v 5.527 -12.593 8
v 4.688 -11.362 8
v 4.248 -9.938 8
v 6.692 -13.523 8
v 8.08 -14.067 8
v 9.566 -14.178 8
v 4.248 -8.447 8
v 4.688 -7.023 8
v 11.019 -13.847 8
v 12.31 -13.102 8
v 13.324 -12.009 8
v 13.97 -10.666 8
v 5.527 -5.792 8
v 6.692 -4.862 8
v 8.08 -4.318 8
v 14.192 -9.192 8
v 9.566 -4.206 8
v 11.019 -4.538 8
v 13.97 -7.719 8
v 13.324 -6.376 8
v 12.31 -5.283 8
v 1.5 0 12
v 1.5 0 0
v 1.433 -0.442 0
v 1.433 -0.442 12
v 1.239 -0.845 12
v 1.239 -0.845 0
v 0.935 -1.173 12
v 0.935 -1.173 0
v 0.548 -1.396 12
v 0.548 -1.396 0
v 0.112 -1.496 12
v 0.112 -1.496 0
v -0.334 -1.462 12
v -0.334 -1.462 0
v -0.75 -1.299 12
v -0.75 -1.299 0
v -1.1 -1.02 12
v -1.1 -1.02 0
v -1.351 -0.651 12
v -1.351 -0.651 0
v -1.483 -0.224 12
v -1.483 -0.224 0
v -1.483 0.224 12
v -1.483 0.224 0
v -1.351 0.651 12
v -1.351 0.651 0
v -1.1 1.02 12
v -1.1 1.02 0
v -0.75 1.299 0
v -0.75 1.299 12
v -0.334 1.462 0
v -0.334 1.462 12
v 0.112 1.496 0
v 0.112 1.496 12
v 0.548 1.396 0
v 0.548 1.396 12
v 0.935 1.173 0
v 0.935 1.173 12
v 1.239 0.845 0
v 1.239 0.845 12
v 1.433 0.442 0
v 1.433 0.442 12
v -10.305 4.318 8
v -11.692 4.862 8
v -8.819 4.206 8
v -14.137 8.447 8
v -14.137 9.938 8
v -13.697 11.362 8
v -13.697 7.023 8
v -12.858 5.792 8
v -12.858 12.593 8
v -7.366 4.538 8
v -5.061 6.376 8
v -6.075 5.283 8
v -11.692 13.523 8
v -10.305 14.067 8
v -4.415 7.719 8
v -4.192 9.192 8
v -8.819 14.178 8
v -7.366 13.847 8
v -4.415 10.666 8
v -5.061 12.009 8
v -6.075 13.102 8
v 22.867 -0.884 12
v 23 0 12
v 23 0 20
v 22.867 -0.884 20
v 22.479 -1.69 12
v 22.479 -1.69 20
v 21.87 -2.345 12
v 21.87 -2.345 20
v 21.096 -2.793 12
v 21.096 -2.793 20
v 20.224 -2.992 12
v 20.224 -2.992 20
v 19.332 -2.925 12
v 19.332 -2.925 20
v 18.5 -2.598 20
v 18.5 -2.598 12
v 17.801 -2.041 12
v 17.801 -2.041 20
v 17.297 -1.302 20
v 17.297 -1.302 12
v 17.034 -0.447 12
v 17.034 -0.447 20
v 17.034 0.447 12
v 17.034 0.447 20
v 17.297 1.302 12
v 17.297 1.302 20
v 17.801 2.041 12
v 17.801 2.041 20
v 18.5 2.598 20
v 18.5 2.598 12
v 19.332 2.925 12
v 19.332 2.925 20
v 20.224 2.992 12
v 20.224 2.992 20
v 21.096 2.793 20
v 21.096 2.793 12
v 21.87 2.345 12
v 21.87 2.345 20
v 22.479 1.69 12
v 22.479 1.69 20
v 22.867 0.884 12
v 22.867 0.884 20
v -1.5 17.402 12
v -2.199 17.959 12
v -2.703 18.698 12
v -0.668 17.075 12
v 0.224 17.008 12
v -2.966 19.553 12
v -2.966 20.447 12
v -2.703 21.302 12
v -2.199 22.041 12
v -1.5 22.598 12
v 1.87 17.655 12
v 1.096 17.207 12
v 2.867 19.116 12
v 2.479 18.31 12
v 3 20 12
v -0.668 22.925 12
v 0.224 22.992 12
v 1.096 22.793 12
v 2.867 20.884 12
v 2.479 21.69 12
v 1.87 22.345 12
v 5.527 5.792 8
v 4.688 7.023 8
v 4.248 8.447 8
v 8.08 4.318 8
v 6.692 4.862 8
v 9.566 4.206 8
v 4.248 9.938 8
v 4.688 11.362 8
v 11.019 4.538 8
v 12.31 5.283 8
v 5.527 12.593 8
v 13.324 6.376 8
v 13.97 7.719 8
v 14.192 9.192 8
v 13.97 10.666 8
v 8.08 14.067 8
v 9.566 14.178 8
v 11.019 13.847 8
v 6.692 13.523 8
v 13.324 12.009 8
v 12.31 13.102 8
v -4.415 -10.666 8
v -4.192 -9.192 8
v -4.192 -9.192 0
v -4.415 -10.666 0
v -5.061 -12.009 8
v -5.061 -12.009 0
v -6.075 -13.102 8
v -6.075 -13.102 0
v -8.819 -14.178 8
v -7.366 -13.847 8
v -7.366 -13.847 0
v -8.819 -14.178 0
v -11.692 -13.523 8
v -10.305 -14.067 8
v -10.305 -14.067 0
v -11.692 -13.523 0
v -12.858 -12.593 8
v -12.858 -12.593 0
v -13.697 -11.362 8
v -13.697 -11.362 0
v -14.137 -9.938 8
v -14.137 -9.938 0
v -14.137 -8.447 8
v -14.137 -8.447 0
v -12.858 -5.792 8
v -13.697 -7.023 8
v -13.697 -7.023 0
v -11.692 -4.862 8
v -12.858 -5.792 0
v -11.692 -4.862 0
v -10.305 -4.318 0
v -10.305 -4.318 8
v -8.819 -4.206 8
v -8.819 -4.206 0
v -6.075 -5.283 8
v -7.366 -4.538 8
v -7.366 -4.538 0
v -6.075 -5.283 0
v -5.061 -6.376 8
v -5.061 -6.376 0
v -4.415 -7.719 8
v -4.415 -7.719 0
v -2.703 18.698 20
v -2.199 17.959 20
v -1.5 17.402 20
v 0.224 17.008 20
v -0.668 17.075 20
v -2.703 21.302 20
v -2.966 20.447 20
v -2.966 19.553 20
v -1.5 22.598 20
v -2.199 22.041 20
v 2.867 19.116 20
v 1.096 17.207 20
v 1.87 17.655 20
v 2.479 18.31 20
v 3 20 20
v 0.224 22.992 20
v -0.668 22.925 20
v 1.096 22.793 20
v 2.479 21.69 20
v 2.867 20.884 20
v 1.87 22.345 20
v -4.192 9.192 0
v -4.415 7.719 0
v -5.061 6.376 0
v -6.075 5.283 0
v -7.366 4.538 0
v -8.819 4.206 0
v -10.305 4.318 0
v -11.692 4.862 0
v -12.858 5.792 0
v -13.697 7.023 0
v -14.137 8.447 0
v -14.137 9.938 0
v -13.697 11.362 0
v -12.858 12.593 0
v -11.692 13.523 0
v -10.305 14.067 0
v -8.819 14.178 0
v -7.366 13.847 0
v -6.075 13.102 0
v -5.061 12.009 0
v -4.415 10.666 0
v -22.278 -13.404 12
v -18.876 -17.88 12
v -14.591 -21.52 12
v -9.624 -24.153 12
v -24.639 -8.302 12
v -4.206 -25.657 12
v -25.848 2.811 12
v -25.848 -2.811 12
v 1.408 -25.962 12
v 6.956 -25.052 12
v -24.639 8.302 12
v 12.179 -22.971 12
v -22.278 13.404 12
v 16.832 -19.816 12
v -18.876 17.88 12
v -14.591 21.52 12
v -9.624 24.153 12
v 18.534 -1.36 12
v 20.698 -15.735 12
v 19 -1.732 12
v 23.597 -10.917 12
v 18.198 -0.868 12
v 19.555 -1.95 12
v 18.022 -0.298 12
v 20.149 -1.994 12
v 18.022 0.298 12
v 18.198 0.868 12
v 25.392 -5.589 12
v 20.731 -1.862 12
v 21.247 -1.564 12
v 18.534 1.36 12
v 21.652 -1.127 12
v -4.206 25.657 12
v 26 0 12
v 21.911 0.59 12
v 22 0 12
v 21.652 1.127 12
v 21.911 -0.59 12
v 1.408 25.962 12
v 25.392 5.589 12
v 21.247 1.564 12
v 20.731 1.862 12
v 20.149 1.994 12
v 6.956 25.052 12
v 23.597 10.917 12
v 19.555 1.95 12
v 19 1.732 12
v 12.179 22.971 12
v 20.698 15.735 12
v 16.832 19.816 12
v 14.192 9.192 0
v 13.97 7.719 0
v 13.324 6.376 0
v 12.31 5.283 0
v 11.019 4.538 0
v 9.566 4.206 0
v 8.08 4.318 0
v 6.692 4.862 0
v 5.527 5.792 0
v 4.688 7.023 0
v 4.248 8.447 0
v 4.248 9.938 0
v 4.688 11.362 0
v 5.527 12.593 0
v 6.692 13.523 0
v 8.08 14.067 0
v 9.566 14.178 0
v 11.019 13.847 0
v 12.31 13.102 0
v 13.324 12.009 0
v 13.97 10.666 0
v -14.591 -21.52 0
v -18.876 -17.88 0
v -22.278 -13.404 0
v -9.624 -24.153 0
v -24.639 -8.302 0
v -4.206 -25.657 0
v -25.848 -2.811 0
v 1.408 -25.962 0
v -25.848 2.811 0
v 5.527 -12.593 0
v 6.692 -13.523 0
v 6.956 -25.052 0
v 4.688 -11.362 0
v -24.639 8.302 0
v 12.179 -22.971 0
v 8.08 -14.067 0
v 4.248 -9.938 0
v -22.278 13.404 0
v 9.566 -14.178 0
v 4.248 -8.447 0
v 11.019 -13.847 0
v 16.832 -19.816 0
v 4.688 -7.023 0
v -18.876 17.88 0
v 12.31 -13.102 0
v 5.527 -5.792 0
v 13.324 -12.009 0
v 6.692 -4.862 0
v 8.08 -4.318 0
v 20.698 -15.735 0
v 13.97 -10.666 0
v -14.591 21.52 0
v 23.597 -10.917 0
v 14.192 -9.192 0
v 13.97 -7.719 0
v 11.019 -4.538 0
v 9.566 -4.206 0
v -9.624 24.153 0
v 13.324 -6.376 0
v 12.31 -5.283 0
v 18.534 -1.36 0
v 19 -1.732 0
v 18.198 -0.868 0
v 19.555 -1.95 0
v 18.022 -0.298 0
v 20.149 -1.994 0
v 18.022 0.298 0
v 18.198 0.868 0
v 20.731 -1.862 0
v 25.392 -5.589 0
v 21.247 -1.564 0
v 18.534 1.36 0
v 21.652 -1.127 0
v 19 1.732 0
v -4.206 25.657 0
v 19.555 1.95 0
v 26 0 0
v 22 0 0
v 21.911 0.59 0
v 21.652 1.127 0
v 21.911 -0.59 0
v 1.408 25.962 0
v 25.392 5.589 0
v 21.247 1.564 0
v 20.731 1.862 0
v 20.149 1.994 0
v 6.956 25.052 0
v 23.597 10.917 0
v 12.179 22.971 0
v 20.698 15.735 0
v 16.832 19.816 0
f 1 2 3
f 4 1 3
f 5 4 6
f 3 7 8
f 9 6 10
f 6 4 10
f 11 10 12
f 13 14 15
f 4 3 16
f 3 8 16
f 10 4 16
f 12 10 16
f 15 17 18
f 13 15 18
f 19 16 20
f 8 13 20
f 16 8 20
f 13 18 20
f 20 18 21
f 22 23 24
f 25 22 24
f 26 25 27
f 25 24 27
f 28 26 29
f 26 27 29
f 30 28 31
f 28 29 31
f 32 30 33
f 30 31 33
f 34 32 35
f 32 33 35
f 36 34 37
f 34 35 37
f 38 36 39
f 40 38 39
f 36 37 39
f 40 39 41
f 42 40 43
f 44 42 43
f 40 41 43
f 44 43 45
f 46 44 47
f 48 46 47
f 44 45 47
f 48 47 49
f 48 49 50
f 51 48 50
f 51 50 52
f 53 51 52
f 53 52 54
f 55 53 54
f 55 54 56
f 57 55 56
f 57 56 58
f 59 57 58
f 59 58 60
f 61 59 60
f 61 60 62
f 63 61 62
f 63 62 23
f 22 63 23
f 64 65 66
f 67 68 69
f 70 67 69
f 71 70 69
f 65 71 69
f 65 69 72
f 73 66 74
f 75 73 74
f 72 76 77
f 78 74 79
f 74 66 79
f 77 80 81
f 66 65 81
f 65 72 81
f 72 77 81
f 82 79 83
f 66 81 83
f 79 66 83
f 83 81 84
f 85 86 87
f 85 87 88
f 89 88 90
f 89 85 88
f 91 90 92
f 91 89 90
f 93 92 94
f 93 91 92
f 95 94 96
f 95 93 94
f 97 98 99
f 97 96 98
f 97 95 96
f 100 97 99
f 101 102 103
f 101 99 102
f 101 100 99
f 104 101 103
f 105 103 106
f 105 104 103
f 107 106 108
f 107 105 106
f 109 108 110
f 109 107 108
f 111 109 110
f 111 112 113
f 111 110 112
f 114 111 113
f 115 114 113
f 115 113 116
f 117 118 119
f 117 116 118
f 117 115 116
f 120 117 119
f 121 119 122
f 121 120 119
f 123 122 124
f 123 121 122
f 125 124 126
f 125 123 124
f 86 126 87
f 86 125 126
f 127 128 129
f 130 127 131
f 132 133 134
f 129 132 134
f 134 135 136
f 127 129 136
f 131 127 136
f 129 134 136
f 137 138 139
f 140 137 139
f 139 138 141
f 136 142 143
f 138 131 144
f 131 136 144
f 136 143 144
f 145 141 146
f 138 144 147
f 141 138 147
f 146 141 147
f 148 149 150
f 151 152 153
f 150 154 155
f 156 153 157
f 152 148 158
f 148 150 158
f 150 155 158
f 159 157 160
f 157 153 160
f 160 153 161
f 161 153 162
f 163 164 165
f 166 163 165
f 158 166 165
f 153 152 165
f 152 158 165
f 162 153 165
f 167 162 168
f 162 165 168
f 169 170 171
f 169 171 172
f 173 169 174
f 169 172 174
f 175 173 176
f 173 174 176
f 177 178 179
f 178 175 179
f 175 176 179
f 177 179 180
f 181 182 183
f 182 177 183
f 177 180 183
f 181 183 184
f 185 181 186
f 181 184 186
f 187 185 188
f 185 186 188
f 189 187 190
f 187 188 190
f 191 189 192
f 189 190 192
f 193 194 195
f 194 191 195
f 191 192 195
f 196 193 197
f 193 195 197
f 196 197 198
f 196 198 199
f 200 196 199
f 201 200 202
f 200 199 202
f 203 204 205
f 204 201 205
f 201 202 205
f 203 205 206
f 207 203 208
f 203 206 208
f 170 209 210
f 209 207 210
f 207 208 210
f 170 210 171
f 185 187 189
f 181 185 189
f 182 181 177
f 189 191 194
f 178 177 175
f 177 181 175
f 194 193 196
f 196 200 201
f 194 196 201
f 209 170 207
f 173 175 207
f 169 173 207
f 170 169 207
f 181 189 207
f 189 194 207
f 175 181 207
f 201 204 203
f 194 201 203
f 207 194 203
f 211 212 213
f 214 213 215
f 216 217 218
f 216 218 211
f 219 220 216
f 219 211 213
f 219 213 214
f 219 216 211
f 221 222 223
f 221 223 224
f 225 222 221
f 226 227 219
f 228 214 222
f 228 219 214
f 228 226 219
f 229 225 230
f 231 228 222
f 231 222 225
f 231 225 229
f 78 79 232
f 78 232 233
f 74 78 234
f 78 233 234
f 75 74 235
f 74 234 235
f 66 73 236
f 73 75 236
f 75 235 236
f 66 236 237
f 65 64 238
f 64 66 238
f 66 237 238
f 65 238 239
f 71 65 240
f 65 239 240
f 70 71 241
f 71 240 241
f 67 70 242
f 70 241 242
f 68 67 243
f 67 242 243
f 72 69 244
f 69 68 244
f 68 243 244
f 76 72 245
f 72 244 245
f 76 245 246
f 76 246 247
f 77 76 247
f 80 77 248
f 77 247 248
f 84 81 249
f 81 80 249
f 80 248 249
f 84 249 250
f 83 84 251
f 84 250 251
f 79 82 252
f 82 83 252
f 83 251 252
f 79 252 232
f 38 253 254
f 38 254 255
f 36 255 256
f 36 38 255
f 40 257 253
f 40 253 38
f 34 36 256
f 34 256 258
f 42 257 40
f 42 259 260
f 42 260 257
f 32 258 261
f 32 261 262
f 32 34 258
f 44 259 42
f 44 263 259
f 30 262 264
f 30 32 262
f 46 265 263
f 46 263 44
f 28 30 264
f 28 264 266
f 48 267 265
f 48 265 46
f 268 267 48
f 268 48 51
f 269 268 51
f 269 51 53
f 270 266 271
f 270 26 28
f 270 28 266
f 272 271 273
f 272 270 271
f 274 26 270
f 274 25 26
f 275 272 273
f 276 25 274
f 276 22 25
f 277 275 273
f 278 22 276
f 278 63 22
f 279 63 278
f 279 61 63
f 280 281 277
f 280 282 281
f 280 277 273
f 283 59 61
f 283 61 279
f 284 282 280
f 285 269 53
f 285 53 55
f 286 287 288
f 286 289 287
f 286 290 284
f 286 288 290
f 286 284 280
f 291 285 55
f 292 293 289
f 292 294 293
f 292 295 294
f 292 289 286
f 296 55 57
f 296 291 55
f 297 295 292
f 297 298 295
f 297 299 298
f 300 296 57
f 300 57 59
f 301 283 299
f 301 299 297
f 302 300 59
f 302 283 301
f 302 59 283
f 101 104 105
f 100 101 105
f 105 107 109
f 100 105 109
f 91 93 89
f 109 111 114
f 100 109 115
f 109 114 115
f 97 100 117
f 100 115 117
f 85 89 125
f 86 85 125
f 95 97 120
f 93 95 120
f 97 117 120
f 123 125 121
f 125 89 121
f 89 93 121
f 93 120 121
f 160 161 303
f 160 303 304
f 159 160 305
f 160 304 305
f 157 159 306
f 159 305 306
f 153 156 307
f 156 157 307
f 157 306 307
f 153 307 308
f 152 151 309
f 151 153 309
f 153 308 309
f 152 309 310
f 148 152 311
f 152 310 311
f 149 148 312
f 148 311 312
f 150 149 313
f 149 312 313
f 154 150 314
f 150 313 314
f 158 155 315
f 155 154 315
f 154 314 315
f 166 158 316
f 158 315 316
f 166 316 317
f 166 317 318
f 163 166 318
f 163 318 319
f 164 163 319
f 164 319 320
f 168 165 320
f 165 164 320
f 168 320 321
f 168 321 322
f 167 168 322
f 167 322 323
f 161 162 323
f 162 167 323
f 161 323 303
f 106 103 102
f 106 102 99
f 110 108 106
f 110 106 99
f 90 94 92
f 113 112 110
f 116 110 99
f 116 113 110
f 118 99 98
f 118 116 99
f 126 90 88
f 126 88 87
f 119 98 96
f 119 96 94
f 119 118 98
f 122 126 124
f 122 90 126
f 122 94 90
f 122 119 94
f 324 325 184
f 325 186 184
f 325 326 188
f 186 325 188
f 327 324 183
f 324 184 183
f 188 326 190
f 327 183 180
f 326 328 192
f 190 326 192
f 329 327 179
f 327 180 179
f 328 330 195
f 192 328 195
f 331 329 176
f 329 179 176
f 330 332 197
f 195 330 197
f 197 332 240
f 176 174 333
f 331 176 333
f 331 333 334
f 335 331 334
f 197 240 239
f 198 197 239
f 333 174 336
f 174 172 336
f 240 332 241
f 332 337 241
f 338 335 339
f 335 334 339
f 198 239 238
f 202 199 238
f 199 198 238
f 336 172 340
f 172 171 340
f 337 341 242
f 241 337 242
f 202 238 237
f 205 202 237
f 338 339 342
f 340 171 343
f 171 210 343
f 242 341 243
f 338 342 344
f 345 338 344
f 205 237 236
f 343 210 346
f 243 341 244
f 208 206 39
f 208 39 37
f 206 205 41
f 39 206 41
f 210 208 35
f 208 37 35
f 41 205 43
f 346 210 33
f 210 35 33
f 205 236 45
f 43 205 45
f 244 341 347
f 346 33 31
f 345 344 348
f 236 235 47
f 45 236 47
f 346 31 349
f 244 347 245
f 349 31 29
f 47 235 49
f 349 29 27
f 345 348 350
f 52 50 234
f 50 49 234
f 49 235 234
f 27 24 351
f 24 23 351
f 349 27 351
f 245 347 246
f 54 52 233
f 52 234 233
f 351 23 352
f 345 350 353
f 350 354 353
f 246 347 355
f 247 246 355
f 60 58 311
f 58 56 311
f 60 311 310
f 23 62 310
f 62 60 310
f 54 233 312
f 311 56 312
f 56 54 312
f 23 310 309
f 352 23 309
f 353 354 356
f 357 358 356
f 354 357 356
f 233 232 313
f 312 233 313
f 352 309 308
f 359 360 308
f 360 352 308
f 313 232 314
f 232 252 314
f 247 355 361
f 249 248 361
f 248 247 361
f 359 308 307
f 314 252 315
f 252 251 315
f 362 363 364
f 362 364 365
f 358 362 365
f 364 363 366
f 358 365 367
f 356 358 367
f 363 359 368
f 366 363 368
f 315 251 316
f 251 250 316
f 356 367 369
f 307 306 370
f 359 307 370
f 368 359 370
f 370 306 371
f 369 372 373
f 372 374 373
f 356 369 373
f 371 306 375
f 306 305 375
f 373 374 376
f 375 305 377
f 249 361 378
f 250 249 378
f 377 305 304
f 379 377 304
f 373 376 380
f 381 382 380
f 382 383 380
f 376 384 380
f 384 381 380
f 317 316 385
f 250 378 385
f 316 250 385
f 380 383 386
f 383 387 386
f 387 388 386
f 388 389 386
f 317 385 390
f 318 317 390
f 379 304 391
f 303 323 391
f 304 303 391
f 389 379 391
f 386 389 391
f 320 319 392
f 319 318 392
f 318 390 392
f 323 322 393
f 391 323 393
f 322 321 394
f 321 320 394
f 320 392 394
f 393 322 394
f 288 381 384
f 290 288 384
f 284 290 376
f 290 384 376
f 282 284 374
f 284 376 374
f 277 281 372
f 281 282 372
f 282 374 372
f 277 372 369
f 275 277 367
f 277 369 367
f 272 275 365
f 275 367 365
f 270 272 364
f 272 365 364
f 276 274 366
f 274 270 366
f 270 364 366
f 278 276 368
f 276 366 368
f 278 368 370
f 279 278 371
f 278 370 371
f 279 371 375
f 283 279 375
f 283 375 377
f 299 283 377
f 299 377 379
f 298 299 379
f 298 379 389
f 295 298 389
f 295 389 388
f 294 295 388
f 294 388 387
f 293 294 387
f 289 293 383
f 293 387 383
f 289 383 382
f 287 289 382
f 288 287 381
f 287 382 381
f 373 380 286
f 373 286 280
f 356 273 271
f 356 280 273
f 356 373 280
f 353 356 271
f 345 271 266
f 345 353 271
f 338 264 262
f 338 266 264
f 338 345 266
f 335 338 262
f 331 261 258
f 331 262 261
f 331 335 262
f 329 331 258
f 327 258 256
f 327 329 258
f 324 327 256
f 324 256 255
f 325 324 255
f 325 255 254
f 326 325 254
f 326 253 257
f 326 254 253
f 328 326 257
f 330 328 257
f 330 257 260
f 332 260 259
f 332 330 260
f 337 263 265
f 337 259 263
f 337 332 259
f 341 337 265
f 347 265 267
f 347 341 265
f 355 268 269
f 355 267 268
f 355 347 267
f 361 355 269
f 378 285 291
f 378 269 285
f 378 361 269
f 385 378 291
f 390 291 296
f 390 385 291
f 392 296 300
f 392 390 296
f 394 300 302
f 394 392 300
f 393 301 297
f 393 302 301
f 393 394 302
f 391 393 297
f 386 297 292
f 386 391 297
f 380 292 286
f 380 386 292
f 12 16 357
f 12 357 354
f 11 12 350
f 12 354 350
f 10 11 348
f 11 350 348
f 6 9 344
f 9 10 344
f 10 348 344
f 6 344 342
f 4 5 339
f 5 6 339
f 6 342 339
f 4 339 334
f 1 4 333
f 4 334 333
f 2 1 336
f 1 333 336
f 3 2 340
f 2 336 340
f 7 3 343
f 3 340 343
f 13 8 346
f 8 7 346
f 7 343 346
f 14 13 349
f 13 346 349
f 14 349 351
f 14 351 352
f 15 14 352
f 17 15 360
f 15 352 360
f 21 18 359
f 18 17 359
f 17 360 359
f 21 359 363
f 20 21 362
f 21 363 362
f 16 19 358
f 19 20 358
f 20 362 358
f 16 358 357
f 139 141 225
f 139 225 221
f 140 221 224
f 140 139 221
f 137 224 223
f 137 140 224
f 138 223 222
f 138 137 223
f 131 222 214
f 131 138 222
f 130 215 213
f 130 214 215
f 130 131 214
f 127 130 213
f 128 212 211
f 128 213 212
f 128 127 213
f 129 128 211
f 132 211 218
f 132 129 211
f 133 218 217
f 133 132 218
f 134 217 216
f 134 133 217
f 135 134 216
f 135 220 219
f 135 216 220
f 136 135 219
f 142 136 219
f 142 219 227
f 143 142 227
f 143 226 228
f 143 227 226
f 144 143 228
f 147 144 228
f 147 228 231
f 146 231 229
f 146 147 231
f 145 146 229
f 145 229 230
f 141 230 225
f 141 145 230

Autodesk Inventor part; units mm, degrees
ref_plane "YZ Plane" through (0, 0, 0) normal (1, 0, 0) x (0, 1, 0)
ref_plane "XZ Plane" through (0, 0, 0) normal (0, 1, 0) x (-1, 0, 0)
sketch "Skizze1" plane through (0, 0, 0) normal (0, 0, 1) x (1, 0, 0)
  circle A0 centre (0, 0) radius 26
extrude "Extrusion1" add sketch "Skizze1" along normal blind 12
ref_plane "Arbeitsebene1" through (0, 0, 12) normal (0, 0, 1) x (1, 0, 0)
sketch "Skizze2" plane through (0, 0, 0) normal (0, 0, 1) x (1, 0, 0)
  circle A0 centre (0, 0) radius 1.5
extrude "Extrusion2" cut sketch "Skizze2" along normal blind 13
sketch "Skizze3" plane through (0, 0, 12) normal (0, 0, 1) x (1, 0, 0)
  circle A0 centre (20, 0) radius 3
extrude "Extrusion3" add sketch "Skizze3" along normal blind 8 separate body
sketch "Skizze4" plane through (0, 0, 12) normal (0, 0, 1) x (1, 0, 0)
  circle A0 centre (0, 20) radius 3
extrude "Extrusion4" add sketch "Skizze4" along normal blind 8 separate body
sketch "Skizze5" plane through (0, 0, 0) normal (0, 0, 1) x (1, 0, 0)
  circle A0 centre (20, 0) radius 2
extrude "Extrusion5" cut sketch "Skizze5" along normal blind 12 bodies 1
sketch "Skizze6" plane through (0, 0, 0) normal (0, 0, 1) x (1, 0, 0)
  circle A0 centre (9.1924, 9.1924) radius 5
  circle A1 centre (-9.1924, 9.1924) radius 5
  circle A2 centre (-9.1924, -9.1924) radius 5
  circle A3 centre (9.1924, -9.1924) radius 5
extrude "Extrusion6" cut sketch "Skizze6" along normal blind 8 bodies 1
properties part number "Kupplungsscheibe_v2"
